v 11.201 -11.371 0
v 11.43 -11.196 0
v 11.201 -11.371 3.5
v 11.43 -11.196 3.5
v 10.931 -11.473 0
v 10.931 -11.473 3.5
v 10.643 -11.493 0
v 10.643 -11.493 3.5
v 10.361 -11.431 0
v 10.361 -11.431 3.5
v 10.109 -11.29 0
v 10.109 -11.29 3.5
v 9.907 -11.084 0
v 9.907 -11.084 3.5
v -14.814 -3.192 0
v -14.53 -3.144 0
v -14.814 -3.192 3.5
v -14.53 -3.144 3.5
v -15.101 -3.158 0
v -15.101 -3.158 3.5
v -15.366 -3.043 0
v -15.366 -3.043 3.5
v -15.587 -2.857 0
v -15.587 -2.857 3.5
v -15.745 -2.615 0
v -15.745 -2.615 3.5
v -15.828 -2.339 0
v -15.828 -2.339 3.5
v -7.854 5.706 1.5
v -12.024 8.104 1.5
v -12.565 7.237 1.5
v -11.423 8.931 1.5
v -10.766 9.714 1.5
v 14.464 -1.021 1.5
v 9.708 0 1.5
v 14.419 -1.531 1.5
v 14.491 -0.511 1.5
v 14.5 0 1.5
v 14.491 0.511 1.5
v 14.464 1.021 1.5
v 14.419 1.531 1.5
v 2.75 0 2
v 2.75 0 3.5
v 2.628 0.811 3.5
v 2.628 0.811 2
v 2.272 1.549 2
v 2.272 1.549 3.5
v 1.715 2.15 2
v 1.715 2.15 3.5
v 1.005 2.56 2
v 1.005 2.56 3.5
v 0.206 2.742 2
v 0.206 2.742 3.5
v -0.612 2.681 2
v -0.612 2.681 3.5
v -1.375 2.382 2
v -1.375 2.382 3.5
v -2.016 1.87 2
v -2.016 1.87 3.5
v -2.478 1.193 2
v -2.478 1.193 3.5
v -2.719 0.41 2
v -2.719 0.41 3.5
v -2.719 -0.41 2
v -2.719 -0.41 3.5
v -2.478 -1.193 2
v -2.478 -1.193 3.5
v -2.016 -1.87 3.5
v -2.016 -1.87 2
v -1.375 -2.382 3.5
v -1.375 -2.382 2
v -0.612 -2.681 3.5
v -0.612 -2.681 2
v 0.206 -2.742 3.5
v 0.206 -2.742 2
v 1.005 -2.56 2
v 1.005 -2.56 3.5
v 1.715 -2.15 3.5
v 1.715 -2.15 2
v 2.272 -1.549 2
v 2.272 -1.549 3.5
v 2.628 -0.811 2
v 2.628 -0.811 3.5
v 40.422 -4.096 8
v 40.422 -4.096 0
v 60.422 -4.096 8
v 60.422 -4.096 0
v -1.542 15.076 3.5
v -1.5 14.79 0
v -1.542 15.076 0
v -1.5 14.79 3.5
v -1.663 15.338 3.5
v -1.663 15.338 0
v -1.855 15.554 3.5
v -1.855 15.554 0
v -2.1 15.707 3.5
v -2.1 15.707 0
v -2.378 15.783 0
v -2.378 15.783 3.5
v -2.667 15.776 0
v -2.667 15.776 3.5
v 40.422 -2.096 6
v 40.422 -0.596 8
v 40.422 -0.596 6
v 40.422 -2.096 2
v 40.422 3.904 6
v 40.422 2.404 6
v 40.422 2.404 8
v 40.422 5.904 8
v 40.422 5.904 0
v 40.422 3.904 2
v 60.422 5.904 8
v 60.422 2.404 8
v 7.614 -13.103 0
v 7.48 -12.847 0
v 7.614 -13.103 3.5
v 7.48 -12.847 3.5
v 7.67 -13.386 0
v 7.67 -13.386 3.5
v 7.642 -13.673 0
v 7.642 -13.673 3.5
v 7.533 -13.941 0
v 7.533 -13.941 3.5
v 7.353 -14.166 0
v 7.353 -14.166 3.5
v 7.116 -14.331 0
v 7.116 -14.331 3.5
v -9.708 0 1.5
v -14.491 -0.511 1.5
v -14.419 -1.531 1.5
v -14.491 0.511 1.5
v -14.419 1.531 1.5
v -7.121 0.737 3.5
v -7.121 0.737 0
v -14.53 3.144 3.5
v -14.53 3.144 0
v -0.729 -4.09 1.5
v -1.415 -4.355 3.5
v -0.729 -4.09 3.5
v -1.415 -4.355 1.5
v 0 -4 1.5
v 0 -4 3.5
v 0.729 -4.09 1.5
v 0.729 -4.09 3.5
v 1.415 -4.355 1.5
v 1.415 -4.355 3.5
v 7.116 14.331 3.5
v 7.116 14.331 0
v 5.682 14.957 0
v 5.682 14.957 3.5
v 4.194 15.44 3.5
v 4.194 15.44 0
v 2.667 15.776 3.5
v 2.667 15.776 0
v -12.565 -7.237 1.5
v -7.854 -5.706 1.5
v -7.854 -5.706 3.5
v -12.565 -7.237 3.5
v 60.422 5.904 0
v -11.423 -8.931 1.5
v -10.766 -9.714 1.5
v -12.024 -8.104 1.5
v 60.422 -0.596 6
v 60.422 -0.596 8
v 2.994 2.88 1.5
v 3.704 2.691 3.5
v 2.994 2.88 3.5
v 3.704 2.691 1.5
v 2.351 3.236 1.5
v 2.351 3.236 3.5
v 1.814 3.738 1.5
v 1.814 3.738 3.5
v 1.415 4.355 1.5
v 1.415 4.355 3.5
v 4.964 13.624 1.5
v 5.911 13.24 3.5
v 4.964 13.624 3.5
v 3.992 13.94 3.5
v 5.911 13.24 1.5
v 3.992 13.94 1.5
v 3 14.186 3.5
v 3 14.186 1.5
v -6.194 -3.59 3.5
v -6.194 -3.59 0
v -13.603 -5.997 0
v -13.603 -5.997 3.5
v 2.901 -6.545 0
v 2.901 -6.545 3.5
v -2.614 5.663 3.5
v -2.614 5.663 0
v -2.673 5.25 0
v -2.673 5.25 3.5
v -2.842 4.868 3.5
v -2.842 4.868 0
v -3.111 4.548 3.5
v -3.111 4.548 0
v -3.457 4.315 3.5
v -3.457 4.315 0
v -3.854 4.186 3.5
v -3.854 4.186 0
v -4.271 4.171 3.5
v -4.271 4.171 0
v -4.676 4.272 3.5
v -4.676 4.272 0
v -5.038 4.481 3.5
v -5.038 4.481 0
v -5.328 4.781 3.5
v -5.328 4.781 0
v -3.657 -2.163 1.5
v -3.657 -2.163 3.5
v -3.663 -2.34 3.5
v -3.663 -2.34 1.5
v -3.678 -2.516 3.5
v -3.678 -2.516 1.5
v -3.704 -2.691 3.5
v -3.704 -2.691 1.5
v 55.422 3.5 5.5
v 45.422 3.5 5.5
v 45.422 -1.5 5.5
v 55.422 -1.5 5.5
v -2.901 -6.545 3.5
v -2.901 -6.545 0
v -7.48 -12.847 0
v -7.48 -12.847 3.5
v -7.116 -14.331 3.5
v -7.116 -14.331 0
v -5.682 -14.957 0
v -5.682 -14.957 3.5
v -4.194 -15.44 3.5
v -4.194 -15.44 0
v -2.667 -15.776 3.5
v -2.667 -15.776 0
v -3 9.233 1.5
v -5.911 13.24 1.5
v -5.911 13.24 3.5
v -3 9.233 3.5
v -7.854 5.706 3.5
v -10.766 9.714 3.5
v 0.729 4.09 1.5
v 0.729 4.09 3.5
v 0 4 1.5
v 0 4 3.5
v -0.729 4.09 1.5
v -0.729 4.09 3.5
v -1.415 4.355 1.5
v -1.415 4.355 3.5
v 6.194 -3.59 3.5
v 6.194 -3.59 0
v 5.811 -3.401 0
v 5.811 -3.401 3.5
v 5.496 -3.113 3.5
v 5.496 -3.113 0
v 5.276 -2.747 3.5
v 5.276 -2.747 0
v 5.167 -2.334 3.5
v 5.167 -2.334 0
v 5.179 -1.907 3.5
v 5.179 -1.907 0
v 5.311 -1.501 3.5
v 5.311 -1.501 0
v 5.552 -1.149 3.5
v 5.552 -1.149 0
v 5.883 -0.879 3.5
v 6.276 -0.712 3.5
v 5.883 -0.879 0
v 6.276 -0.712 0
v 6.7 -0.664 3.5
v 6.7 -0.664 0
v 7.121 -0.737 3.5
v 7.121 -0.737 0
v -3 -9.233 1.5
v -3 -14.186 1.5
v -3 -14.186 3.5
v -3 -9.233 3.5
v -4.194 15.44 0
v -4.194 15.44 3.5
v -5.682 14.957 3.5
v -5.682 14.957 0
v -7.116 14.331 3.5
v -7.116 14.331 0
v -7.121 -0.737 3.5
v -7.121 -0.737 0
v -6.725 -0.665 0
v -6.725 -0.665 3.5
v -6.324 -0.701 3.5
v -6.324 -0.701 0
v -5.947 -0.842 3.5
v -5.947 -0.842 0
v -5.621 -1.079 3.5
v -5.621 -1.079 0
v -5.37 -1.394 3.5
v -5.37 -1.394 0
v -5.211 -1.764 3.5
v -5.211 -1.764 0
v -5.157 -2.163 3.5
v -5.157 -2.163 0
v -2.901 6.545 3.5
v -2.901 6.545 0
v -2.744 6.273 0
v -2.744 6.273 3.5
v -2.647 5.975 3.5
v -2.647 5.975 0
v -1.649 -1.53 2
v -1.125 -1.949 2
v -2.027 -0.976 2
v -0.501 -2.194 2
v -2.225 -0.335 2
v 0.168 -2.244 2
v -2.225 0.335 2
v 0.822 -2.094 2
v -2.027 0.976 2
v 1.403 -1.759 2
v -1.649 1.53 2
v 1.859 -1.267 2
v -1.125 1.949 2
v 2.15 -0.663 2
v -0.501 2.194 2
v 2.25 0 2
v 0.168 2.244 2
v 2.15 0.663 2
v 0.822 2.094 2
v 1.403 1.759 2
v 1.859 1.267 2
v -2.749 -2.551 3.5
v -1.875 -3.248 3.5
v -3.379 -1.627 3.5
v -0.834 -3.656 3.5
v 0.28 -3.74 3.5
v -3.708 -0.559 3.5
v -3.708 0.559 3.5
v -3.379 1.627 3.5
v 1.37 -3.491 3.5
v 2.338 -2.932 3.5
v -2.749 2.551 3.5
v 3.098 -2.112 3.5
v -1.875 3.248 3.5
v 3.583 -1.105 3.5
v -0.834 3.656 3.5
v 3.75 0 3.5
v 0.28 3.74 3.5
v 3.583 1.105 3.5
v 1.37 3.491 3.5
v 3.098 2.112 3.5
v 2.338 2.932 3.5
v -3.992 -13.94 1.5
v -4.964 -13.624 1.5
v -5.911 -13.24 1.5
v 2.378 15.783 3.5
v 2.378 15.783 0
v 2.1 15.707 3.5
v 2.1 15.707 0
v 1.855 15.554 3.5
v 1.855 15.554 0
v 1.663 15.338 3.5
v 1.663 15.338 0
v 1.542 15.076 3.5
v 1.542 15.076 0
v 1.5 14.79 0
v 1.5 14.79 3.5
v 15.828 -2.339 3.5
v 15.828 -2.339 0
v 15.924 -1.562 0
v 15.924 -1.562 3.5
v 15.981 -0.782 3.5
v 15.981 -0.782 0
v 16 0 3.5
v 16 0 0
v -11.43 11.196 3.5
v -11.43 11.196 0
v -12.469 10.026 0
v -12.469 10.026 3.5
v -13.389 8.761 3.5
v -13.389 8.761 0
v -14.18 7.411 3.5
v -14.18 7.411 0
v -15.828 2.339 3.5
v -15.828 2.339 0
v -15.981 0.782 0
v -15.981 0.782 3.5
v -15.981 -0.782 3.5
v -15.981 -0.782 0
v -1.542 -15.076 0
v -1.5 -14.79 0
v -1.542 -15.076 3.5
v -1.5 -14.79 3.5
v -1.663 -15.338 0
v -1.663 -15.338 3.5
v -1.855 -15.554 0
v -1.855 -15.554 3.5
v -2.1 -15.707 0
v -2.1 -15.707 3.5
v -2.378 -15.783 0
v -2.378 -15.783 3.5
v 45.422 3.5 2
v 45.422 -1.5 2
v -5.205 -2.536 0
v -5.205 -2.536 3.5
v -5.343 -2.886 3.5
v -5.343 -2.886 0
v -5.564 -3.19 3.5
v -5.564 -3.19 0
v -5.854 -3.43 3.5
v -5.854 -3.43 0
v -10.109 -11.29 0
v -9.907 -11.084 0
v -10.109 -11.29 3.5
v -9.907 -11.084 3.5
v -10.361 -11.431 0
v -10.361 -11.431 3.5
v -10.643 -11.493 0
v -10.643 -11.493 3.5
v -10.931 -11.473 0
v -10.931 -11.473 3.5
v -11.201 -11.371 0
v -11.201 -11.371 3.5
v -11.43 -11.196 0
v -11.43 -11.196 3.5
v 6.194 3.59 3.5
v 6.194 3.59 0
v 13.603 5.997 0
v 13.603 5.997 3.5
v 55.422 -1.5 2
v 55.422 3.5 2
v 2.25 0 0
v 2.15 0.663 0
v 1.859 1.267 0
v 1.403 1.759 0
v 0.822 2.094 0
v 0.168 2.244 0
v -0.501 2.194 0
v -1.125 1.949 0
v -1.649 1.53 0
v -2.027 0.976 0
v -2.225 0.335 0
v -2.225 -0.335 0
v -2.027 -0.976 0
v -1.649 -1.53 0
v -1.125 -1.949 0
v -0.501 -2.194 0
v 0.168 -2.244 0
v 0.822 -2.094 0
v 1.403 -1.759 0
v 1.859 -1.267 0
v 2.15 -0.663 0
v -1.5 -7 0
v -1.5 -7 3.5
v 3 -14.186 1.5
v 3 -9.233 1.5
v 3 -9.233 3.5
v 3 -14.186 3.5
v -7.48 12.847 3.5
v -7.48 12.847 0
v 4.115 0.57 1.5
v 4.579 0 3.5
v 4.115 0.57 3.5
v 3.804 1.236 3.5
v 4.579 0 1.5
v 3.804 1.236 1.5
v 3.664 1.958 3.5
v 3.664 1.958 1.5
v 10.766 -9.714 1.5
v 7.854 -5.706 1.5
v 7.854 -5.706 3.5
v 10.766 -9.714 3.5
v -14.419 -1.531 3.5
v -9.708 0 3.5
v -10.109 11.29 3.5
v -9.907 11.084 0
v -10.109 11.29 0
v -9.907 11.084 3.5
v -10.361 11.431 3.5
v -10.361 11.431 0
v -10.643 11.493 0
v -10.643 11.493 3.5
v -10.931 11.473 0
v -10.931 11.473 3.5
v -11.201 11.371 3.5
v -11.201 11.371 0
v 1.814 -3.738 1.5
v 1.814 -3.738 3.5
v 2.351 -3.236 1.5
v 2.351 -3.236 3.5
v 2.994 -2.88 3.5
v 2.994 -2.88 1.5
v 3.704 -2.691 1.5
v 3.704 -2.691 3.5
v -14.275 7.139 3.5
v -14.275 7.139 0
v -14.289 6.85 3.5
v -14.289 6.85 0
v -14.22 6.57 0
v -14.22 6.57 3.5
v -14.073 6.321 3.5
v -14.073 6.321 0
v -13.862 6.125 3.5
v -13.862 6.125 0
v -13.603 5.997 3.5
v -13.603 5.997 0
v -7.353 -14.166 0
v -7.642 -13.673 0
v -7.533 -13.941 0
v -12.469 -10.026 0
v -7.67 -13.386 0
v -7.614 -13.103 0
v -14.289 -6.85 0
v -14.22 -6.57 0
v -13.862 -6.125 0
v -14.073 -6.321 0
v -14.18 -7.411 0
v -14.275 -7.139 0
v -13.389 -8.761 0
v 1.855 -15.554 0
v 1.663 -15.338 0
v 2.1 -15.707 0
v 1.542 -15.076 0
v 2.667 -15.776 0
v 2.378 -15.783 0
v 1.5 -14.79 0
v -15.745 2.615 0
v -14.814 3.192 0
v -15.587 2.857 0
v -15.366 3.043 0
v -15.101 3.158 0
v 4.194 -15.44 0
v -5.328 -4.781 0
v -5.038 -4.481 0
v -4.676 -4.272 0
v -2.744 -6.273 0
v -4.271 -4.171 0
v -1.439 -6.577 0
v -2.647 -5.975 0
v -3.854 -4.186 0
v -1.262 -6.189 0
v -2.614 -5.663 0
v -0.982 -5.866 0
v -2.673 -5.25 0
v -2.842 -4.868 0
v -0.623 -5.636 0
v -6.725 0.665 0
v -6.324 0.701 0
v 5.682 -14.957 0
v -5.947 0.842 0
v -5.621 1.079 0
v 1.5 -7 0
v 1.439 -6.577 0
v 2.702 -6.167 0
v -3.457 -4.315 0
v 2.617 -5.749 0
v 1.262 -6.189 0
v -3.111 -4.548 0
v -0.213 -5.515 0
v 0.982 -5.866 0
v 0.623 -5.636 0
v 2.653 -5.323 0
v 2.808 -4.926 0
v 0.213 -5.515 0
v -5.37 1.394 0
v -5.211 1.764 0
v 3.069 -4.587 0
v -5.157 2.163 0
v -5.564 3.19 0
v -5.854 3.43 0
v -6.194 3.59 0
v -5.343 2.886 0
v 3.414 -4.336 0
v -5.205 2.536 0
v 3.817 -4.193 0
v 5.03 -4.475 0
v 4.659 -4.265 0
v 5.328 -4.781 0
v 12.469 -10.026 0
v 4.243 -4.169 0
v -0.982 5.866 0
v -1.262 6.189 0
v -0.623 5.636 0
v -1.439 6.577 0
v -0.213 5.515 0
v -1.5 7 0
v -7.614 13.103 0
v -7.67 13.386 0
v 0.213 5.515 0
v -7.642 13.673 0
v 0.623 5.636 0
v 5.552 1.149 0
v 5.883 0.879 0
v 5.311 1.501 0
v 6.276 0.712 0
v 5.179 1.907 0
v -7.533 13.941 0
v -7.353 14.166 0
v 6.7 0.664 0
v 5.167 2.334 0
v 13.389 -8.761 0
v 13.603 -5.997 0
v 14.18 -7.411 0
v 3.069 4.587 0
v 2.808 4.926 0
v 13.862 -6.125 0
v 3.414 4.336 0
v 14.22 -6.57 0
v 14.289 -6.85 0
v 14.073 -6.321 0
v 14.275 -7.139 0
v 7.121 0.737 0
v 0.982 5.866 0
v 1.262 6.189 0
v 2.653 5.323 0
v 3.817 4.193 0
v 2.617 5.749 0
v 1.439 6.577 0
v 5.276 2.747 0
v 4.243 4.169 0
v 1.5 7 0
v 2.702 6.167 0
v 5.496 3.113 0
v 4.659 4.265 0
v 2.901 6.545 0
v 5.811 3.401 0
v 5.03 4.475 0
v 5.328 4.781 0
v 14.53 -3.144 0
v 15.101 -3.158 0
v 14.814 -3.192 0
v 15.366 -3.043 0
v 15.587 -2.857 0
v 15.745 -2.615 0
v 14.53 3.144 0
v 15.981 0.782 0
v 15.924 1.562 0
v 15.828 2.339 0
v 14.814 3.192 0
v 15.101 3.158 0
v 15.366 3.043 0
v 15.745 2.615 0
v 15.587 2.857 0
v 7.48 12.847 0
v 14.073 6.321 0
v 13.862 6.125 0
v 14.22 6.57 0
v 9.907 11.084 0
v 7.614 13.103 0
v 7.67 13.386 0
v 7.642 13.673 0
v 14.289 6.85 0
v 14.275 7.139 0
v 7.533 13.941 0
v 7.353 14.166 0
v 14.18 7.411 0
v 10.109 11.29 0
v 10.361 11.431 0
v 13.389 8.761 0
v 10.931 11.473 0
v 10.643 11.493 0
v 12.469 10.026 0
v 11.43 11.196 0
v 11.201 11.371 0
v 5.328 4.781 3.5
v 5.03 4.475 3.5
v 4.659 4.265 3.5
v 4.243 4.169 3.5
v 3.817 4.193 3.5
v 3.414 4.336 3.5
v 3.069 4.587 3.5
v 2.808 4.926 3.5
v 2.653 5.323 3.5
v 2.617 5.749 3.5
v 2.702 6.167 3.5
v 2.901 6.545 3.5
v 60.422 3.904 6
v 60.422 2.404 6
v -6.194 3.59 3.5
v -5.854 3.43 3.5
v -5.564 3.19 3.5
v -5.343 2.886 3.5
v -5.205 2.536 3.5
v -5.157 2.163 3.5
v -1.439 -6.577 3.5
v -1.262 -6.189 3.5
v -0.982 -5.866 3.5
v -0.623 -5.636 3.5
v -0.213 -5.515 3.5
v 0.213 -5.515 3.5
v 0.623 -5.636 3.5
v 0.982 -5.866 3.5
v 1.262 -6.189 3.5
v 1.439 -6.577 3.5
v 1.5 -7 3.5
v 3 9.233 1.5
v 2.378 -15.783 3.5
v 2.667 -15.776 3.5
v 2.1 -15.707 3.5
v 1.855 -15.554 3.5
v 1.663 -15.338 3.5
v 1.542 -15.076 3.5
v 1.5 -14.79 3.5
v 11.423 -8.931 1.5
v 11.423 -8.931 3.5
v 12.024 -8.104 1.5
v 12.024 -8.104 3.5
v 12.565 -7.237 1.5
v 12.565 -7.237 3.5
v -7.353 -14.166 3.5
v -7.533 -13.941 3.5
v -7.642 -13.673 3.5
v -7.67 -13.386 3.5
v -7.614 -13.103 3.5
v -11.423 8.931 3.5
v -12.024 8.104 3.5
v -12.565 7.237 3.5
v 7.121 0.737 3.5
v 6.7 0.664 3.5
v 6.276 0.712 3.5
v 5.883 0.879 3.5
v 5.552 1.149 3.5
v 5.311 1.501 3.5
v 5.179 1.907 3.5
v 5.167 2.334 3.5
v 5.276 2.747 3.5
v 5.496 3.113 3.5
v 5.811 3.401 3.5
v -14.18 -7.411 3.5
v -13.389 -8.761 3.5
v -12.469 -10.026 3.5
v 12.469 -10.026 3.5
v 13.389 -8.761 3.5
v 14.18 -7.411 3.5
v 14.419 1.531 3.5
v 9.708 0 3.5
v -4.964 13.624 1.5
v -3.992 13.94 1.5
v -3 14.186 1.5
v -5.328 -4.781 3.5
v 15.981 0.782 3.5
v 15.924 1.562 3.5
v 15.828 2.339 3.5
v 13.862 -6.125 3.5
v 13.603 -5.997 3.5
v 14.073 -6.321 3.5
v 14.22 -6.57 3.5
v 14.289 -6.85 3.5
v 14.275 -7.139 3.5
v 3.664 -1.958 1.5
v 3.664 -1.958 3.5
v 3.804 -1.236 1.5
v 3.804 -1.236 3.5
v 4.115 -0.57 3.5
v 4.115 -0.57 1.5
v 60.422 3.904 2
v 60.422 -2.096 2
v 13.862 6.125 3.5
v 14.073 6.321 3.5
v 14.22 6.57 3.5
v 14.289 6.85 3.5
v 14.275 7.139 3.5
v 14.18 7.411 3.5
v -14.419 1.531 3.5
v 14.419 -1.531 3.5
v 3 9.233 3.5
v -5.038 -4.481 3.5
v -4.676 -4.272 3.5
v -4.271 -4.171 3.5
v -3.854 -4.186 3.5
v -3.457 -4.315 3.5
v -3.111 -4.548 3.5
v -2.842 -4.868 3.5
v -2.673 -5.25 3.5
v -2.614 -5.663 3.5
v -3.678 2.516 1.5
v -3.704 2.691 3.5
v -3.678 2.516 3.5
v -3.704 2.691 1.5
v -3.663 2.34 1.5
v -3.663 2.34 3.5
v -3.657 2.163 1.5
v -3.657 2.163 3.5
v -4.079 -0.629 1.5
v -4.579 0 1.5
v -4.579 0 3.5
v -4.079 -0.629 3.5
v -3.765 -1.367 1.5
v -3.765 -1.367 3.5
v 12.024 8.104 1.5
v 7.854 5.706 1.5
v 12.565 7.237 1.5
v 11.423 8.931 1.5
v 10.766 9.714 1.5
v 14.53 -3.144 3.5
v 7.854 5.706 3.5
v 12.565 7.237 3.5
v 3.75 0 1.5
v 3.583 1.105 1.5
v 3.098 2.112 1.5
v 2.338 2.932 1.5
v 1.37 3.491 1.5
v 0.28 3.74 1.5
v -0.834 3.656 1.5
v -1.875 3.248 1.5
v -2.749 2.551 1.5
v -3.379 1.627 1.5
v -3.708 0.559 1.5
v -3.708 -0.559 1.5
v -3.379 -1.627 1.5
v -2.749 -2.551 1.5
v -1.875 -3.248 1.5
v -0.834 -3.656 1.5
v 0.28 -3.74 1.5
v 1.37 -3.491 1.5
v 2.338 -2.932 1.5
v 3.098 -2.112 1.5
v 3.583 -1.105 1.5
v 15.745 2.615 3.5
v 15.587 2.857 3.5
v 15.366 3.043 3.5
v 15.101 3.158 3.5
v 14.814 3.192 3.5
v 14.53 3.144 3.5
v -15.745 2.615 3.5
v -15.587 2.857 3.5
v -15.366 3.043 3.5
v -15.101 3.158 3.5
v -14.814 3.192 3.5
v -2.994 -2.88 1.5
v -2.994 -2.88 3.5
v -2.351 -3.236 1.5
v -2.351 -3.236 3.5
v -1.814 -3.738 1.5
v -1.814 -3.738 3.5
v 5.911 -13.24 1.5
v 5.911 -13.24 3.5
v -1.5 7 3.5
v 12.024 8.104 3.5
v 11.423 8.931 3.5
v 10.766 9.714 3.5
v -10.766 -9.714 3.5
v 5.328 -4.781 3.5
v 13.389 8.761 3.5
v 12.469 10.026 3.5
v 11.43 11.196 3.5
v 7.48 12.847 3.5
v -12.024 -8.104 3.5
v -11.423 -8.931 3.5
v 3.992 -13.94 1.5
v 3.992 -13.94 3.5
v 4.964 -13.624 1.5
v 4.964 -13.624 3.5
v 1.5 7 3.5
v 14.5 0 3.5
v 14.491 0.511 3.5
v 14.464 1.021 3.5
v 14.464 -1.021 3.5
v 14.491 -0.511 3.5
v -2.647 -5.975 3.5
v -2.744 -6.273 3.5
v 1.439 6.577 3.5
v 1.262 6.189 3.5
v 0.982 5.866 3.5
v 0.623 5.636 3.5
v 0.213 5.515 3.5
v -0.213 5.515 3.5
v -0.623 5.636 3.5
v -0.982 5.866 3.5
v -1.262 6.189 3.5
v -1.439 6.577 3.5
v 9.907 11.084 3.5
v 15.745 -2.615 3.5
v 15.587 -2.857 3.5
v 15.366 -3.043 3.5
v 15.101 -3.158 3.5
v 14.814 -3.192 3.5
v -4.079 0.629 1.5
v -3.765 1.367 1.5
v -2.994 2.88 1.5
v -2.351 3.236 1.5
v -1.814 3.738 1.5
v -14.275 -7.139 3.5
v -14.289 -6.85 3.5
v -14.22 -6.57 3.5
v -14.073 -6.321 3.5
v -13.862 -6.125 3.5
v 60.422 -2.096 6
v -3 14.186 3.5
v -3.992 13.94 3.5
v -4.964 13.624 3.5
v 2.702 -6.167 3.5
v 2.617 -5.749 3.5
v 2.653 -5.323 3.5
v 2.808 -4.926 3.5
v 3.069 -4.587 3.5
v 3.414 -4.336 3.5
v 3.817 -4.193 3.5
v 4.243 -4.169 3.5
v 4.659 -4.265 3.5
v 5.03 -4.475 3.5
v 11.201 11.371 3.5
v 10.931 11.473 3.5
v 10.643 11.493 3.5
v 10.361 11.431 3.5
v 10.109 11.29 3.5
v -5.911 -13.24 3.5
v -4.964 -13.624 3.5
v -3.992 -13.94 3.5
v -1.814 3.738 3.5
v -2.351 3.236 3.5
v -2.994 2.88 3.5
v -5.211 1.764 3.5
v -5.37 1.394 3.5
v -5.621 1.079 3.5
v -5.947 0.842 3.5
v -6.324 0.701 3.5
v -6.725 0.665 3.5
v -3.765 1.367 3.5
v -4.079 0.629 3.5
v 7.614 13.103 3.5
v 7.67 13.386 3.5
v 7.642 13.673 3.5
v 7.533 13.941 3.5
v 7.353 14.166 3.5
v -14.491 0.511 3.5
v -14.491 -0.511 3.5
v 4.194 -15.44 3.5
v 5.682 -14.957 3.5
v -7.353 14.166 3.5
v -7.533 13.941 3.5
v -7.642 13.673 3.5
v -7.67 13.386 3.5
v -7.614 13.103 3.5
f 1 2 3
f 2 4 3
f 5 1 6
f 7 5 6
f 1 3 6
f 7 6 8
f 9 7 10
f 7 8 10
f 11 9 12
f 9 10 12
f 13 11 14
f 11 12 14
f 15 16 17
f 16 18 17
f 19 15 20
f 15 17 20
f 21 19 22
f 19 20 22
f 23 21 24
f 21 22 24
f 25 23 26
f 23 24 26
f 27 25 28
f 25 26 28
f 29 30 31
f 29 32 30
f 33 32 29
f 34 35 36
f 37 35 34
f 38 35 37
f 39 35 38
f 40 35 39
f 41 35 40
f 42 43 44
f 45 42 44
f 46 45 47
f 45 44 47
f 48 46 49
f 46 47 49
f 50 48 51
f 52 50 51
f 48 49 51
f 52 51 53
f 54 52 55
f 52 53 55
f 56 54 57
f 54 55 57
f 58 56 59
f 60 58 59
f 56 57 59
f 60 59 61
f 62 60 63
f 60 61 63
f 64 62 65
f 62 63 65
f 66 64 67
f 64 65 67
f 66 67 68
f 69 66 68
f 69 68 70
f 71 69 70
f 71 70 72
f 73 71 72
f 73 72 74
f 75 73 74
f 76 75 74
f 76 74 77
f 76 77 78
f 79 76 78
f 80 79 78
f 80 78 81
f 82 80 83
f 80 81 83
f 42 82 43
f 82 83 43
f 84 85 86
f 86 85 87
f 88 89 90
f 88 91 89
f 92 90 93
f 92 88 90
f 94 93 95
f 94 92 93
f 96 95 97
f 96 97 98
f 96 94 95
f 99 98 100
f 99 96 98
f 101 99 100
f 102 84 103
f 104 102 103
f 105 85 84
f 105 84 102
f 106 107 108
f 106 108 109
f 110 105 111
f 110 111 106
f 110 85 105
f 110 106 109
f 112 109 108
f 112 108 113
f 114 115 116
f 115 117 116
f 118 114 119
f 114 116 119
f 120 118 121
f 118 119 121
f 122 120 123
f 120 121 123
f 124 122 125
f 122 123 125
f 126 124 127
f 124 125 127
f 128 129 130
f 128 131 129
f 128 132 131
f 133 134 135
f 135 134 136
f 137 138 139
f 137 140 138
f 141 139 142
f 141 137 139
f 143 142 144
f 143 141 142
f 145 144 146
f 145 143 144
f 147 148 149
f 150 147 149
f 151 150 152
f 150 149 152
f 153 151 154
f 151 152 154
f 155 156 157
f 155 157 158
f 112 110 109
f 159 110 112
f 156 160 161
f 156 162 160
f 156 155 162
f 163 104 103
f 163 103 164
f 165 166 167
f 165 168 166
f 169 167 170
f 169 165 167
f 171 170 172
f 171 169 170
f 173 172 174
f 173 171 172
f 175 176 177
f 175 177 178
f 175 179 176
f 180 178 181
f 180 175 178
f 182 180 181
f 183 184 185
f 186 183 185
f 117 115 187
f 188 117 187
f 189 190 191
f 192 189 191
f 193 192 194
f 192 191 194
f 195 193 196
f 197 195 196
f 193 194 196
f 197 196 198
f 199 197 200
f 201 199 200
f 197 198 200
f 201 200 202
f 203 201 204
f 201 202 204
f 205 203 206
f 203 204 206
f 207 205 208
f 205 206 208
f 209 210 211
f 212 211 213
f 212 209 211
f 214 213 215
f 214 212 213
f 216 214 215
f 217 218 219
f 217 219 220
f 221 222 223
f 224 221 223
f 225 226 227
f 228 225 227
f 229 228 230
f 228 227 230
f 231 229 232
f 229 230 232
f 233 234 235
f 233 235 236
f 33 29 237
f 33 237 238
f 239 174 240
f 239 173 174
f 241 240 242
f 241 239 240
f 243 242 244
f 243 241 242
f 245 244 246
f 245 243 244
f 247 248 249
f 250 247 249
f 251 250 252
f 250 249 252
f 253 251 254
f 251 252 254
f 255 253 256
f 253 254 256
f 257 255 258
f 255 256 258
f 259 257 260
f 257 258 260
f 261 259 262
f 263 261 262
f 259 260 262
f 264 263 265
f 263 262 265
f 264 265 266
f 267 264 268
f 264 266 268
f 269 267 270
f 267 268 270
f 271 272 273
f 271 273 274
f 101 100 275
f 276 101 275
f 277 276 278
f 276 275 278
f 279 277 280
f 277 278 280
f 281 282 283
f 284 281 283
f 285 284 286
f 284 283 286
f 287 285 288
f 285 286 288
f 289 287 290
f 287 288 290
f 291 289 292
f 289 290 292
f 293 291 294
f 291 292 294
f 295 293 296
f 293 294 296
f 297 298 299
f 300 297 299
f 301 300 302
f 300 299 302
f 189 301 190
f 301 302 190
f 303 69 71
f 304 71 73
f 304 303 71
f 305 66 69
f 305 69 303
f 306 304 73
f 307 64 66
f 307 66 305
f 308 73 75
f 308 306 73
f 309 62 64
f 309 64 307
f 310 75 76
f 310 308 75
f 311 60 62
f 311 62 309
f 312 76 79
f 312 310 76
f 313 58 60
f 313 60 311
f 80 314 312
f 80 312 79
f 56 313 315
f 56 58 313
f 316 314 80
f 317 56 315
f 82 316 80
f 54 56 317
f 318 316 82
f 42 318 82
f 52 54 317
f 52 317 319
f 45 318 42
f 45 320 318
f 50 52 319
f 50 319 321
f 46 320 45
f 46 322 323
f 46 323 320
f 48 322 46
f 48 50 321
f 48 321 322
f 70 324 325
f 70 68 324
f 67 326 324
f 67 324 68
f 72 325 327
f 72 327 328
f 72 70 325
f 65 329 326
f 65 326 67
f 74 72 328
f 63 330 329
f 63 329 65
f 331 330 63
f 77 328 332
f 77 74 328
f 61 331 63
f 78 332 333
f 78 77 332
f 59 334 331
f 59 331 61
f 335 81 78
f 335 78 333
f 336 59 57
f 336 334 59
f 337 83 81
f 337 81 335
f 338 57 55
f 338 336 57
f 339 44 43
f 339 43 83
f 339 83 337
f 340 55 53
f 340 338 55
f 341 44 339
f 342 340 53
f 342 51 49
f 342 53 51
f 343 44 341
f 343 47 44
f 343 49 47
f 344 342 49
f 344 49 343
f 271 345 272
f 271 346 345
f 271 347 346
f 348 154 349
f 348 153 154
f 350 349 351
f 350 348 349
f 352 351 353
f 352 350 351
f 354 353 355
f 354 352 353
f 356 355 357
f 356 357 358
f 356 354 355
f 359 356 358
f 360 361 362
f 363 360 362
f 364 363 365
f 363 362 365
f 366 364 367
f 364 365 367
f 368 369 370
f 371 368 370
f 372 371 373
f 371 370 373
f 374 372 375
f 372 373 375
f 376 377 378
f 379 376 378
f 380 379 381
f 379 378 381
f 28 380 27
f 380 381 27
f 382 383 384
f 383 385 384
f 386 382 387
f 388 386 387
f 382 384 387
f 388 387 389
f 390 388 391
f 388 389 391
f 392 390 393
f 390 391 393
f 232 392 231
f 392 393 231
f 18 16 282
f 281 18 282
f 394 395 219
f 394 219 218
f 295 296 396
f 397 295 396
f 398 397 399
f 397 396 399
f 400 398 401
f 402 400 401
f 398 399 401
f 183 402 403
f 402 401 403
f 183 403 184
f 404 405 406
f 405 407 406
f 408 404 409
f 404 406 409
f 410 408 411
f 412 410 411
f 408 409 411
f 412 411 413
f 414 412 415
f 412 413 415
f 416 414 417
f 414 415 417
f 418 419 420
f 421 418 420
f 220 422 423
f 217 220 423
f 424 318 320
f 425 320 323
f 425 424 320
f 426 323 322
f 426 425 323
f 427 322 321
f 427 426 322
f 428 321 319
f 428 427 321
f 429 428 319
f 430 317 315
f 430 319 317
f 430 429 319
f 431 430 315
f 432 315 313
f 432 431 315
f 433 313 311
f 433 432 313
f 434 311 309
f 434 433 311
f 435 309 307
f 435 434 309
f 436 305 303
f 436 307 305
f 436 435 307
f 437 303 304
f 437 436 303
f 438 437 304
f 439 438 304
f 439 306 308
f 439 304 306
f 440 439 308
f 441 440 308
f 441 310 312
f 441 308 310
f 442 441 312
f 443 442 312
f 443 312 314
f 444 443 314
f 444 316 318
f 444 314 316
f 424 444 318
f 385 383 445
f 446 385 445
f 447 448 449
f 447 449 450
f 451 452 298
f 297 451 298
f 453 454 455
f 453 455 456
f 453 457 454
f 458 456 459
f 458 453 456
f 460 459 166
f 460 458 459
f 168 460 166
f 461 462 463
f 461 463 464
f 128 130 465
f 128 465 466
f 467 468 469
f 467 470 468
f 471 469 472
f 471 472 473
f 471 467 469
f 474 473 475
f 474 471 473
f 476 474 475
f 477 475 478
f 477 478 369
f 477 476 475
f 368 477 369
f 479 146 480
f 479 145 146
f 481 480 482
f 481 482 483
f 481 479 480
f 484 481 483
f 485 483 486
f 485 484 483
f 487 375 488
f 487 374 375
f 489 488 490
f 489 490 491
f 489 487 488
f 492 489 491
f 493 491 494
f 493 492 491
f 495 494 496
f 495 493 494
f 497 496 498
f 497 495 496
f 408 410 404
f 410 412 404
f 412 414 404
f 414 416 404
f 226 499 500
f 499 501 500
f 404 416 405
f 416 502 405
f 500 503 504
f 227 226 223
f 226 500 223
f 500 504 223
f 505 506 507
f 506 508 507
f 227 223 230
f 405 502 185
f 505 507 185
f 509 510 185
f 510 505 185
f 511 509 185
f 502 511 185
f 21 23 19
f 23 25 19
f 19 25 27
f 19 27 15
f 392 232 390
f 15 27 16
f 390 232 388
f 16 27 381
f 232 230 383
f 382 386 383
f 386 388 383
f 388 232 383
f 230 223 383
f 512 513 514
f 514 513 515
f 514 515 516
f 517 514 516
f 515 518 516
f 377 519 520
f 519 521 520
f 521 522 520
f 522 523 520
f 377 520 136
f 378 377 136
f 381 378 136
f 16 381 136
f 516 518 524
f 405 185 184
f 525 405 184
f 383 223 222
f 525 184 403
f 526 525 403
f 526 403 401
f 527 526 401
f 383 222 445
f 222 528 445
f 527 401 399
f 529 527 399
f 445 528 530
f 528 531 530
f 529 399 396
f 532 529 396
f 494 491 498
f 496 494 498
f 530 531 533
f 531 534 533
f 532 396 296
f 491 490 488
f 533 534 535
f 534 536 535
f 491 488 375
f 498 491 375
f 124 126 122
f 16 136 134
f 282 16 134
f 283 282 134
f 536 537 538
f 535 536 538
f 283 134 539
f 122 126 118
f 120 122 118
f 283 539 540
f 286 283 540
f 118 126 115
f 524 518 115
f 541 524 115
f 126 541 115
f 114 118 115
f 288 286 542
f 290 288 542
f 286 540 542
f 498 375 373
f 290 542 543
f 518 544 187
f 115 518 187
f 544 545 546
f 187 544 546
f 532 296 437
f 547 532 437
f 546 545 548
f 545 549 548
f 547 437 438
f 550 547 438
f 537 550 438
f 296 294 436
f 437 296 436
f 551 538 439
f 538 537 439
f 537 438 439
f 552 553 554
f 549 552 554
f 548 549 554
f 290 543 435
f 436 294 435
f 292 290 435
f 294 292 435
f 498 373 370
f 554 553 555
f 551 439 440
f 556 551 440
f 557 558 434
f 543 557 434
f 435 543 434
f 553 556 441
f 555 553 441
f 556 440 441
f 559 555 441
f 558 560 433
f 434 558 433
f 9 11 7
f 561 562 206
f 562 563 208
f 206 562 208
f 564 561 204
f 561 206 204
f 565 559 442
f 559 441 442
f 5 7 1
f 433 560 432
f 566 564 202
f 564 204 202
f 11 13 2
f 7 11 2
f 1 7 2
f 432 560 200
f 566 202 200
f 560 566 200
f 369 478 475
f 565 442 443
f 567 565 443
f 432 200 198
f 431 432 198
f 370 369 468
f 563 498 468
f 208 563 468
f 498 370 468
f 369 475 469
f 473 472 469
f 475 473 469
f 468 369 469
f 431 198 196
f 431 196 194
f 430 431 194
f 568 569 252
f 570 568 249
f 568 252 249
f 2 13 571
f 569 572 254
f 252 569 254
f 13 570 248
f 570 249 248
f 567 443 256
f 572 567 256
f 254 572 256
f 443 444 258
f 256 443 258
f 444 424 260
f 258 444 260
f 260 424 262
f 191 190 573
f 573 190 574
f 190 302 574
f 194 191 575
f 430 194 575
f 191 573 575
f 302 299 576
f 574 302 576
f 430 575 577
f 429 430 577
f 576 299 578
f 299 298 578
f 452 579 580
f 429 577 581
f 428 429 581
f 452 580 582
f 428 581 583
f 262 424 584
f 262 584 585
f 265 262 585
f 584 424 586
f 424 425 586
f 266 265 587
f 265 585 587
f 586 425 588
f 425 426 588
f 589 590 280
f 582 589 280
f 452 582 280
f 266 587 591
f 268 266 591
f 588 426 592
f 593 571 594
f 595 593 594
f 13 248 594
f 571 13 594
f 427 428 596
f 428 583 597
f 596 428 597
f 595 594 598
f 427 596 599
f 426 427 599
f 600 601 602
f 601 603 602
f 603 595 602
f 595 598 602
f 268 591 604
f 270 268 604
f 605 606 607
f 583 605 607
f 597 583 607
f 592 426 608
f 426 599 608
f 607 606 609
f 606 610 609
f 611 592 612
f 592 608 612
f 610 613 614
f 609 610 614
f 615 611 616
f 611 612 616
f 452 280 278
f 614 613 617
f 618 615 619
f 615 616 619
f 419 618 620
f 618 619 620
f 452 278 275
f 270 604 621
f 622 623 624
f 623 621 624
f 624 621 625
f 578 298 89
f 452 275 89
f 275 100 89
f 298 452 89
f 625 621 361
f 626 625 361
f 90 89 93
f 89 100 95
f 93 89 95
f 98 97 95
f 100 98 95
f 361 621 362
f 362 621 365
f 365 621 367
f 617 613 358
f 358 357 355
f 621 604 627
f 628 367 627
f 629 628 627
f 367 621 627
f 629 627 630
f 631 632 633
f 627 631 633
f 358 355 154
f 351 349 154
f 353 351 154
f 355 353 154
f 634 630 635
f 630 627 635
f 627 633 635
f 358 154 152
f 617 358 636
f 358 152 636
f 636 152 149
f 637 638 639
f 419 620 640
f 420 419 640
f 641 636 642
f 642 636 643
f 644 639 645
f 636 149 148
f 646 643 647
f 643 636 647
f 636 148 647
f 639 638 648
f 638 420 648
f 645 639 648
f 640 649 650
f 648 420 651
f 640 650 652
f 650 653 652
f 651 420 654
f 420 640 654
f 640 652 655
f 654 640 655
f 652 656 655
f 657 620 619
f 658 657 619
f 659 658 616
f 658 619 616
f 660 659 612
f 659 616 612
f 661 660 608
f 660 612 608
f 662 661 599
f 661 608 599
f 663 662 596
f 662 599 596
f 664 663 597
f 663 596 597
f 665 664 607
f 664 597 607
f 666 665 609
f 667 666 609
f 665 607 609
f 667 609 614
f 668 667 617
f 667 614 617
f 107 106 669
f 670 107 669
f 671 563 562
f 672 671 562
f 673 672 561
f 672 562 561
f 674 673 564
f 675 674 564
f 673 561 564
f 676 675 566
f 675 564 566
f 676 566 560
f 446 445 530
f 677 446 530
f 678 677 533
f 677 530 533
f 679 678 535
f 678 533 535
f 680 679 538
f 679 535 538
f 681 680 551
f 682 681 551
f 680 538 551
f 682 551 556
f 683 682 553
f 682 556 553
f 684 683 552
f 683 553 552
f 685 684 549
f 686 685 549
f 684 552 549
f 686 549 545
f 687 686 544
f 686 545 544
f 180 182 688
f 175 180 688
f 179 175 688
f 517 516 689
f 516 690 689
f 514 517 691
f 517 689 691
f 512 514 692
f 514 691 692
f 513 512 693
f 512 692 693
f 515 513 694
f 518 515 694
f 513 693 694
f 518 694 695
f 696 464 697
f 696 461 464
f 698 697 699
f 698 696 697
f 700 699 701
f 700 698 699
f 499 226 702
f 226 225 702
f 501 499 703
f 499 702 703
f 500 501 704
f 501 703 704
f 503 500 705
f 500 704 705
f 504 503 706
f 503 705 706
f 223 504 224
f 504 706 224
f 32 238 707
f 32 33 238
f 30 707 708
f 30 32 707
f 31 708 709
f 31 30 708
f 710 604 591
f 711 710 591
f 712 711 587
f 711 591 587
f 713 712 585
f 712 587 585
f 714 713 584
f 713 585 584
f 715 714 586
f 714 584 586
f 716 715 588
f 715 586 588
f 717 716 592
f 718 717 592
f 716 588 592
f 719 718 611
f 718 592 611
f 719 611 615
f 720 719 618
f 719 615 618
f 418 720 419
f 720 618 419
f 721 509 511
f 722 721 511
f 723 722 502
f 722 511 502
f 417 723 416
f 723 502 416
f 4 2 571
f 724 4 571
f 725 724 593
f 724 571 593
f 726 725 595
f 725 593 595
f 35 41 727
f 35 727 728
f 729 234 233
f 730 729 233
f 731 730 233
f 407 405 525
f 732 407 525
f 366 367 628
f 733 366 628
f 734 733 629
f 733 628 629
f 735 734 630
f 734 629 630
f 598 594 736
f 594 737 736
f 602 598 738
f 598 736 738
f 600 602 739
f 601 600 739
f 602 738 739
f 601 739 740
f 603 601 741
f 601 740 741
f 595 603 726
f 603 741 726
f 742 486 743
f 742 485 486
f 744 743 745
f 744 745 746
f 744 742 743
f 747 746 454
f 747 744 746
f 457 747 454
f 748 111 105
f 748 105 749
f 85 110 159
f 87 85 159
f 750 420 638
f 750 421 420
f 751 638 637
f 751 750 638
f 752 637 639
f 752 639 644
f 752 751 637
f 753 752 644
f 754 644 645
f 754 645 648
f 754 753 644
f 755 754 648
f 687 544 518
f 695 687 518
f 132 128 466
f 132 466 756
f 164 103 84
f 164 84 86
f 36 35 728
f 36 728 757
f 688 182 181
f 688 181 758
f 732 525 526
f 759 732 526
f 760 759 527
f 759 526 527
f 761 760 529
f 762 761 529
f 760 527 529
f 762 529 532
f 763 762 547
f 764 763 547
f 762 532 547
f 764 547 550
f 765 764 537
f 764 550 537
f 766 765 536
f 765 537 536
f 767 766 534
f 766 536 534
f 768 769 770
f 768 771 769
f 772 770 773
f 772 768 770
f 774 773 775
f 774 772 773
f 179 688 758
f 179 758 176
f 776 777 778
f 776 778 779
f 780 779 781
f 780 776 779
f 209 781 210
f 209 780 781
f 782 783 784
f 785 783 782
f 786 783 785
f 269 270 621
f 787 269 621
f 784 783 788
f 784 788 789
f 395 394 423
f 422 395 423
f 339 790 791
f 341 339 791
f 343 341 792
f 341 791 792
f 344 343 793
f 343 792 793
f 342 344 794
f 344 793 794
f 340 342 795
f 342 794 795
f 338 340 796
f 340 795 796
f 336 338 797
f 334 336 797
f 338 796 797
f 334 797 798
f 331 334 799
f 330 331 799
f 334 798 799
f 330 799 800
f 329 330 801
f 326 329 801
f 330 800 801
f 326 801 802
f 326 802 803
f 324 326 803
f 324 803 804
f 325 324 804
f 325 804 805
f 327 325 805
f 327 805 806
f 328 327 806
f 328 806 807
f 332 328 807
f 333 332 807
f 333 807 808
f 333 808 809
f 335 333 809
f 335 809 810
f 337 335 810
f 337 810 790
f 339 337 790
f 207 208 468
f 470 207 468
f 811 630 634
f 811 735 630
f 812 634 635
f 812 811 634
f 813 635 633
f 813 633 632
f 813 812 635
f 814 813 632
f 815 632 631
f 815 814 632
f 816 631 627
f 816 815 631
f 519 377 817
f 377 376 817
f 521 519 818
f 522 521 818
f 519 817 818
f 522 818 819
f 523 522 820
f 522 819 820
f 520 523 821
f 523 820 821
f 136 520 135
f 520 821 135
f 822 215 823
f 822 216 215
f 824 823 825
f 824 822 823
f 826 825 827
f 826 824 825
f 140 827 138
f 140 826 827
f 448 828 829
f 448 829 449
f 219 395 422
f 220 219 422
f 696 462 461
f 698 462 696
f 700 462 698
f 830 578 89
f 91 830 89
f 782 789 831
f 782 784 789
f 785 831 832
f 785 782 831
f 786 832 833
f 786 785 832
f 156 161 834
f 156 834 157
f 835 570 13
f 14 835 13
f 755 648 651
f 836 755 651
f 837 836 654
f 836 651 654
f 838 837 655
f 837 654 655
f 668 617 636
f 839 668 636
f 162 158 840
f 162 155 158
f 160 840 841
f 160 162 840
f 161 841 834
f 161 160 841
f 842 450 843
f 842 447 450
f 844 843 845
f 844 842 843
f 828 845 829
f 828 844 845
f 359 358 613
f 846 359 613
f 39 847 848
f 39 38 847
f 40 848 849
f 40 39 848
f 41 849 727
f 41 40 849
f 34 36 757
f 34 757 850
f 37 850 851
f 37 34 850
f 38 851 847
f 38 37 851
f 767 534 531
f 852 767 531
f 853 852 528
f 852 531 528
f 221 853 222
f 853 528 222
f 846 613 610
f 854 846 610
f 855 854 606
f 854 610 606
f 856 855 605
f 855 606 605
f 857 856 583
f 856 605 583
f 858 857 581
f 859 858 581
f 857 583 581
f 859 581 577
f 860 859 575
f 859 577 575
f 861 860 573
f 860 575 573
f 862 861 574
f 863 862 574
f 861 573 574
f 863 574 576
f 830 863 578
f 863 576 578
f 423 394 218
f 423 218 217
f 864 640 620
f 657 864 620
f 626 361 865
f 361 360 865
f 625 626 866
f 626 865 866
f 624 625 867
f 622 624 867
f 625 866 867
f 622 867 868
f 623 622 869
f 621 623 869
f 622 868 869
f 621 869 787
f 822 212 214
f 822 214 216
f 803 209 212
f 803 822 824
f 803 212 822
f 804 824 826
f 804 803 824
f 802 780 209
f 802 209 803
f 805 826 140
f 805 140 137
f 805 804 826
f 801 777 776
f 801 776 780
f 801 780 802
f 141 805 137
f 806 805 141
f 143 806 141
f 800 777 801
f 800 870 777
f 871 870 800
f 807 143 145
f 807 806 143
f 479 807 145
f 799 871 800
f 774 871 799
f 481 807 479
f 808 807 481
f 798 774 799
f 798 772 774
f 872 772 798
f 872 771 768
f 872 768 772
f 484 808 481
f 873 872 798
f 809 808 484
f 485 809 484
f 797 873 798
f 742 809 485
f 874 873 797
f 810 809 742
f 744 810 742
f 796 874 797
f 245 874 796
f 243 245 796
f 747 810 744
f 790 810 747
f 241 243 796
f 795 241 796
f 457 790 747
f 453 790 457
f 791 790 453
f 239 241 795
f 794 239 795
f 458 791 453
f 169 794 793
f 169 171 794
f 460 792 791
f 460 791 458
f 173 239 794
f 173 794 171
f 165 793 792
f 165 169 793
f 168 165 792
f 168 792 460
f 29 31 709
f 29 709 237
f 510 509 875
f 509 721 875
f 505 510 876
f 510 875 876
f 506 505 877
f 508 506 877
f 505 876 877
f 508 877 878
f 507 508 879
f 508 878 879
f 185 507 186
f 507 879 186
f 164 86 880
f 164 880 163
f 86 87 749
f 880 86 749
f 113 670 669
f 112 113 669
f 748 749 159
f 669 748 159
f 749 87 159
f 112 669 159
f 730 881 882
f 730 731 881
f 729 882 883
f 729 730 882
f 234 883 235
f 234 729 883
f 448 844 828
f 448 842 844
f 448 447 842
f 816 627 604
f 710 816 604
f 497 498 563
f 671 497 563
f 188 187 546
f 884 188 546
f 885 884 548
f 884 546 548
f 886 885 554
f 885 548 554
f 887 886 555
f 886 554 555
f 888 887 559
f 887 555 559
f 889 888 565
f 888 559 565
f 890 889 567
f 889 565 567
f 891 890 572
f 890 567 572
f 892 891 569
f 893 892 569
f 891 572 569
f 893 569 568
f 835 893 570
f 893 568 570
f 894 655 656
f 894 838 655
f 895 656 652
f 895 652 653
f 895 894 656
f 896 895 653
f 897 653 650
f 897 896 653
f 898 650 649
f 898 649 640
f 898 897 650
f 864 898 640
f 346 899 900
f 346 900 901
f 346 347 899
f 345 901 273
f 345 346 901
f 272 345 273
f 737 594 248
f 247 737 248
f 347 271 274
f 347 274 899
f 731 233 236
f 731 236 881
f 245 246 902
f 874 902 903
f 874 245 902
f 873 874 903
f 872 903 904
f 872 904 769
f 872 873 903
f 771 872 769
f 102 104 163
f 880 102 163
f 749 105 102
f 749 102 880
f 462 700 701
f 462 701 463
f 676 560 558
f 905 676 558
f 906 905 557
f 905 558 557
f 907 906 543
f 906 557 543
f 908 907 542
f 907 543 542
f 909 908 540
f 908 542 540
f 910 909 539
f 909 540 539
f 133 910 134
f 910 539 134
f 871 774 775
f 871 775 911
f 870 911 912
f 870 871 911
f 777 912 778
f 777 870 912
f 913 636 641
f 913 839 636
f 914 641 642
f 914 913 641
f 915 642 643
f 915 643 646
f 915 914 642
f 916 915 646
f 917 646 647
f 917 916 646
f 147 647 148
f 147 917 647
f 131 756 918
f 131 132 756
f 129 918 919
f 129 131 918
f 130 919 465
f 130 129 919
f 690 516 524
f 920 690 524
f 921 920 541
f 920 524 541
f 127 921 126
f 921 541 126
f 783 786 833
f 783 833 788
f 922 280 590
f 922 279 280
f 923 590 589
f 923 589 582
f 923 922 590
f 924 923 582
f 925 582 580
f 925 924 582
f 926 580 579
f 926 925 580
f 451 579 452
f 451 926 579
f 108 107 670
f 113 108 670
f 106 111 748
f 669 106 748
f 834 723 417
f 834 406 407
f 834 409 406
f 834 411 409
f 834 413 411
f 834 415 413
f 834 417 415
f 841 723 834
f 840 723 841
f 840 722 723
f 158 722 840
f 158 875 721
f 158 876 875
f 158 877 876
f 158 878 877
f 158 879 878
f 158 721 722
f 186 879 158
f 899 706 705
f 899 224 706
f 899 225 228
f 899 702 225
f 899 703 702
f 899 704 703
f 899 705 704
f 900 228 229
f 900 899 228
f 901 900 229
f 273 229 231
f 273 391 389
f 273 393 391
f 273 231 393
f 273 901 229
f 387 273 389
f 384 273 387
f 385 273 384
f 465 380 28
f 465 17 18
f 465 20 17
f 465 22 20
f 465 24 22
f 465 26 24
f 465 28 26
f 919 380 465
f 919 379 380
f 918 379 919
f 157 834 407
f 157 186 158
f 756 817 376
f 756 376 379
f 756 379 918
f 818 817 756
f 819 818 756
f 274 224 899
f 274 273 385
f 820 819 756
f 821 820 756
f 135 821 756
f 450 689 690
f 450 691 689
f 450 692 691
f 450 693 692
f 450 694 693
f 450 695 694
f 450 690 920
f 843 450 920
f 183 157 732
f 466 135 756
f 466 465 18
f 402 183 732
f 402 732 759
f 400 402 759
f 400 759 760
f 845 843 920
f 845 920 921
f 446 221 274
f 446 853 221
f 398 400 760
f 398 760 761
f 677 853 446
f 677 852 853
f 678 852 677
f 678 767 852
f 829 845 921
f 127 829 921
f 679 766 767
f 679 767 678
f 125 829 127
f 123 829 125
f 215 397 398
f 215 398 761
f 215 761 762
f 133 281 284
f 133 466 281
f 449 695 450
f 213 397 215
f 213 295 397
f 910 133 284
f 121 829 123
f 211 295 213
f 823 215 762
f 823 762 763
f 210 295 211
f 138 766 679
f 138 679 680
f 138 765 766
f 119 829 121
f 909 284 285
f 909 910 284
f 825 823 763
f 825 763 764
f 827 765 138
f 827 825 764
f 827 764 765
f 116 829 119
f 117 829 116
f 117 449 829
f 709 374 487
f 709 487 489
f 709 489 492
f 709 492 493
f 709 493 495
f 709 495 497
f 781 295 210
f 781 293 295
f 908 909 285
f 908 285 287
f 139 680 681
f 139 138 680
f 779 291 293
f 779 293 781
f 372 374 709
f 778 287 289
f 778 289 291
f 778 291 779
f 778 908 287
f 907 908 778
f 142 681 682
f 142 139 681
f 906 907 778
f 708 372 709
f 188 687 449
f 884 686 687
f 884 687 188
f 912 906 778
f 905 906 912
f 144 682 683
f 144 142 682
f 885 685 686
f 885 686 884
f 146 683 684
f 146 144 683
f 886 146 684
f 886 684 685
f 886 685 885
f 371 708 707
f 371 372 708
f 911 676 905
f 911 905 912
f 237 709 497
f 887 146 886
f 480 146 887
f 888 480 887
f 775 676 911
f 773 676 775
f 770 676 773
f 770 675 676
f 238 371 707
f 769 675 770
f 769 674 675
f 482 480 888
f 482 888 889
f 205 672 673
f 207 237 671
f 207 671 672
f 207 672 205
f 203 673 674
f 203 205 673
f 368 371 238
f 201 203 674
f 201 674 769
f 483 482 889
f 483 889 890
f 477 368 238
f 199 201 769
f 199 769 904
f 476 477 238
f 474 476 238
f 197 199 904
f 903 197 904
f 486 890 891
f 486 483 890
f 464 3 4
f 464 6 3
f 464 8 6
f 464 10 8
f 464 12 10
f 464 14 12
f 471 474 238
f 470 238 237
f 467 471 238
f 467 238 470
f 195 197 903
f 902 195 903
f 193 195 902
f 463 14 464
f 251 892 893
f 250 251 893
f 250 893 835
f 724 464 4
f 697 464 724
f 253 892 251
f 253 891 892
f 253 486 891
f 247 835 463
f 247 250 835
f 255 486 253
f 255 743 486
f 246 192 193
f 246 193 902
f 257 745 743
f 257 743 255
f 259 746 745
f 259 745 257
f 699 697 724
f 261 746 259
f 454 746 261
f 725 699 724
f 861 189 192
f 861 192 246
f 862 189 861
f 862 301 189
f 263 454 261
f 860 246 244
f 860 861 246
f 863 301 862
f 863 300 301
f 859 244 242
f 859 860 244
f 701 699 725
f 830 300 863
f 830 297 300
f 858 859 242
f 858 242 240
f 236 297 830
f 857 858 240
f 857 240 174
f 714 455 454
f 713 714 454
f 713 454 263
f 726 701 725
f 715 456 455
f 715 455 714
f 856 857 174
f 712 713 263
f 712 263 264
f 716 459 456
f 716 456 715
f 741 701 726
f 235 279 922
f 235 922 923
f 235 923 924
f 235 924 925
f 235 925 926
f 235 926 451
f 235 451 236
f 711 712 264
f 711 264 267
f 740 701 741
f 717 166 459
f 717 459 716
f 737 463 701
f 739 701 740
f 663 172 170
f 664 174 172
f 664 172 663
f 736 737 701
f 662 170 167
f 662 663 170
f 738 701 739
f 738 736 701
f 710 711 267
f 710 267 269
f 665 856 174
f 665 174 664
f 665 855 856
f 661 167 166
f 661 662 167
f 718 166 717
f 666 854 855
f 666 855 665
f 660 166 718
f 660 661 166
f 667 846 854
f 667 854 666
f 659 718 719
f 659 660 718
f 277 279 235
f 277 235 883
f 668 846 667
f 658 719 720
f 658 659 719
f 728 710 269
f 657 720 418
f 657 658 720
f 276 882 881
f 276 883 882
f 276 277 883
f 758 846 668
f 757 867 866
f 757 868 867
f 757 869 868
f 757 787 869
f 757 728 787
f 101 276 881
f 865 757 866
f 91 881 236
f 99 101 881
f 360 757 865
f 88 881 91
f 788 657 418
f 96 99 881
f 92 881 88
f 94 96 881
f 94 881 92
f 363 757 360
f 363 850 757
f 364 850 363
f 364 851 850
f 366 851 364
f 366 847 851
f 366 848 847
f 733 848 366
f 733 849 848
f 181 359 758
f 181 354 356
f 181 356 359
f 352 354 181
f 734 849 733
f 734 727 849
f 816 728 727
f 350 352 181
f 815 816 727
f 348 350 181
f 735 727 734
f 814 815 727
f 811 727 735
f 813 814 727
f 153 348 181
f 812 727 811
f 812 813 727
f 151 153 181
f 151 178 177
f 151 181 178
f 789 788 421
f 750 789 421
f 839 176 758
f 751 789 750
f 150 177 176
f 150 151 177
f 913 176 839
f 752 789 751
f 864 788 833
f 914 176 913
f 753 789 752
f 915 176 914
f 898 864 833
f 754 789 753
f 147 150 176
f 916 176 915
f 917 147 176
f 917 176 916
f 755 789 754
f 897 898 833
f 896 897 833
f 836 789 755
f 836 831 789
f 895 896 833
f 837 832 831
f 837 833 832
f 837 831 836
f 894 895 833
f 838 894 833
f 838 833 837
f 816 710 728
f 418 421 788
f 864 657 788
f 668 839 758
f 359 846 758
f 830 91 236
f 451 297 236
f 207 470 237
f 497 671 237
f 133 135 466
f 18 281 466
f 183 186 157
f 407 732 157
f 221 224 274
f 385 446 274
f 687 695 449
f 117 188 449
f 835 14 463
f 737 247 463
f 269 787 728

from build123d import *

# Parameters (mm, degrees)
F0_R      = 2.25
F1_DEPTH  = 3.5
F2_T      = -1.5
F3_R      = 2.75
F4_DEPTH  = 1.5
F5_R      = 1
F6_W      = 20
F6_H      = 10
F7_DEPTH  = 6
F8_T      = -2
F9_W      = 20
F9_H      = 3.5
F10_DEPTH = 2
F11_W     = 10
F11_H     = 5
F12_DEPTH = 3.5


with BuildPart() as f1:
    # F0 (on Top) → F1 (new body)
    with BuildSketch(Plane.XY):
        with BuildLine():
            ThreePointArc((15.613411, -3.495911), (15.903059, -1.758611), (16, 0))
            ThreePointArc((16, 0), (15.903059, 1.758611), (15.613411, 3.495911))
            Line((15.613411, 3.495911), (7.120921, 0.736534))
            ThreePointArc((7.120921, 0.736534), (5.230811, 1.699593), (6.19387, 3.589704))
            Line((6.19387, 3.589704), (14.68636, 6.349081))
            ThreePointArc((14.68636, 6.349081), (12.944272, 9.404564), (10.57667, 12.005584))
            Line((10.57667, 12.005584), (5.328022, 4.781441))
            ThreePointArc((5.328022, 4.781441), (3.232819, 4.449593), (2.900971, 6.544797))
            Line((2.900971, 6.544797), (8.149619, 13.76894))
            ThreePointArc((8.149619, 13.76894), (4.944272, 15.216904), (1.5, 15.929532))
            Line((1.5, 15.929532), (1.5, 7))
            ThreePointArc((1.5, 7), (0, 5.5), (-1.5, 7))
            Line((-1.5, 7), (-1.5, 15.929532))
            ThreePointArc((-1.5, 15.929532), (-4.944272, 15.216904), (-8.149619, 13.76894))
            Line((-8.149619, 13.76894), (-2.900971, 6.544797))
            ThreePointArc((-2.900971, 6.544797), (-2.687912, 6.126644), (-2.614497, 5.663119))
            ThreePointArc((-2.614497, 5.663119), (-3.650971, 4.236534), (-5.328022, 4.781441))
            Line((-5.328022, 4.781441), (-10.57667, 12.005584))
            ThreePointArc((-10.57667, 12.005584), (-12.944272, 9.404564), (-14.68636, 6.349081))
            Line((-14.68636, 6.349081), (-6.19387, 3.589704))
            ThreePointArc((-6.19387, 3.589704), (-5.44387, 3.044797), (-5.157396, 2.163119))
            ThreePointArc((-5.157396, 2.163119), (-5.775718, 0.949593), (-7.120921, 0.736534))
            Line((-7.120921, 0.736534), (-15.613411, 3.495911))
            ThreePointArc((-15.613411, 3.495911), (-16, 0), (-15.613411, -3.495911))
            Line((-15.613411, -3.495911), (-7.120921, -0.736534))
            ThreePointArc((-7.120921, -0.736534), (-5.775718, -0.949593), (-5.157396, -2.163119))
            ThreePointArc((-5.157396, -2.163119), (-5.44387, -3.044797), (-6.19387, -3.589704))
            Line((-6.19387, -3.589704), (-14.68636, -6.349081))
            ThreePointArc((-14.68636, -6.349081), (-12.944272, -9.404564), (-10.57667, -12.005584))
            Line((-10.57667, -12.005584), (-5.328022, -4.781441))
            ThreePointArc((-5.328022, -4.781441), (-3.650971, -4.236534), (-2.614497, -5.663119))
            ThreePointArc((-2.614497, -5.663119), (-2.687912, -6.126644), (-2.900971, -6.544797))
            Line((-2.900971, -6.544797), (-8.149619, -13.76894))
            ThreePointArc((-8.149619, -13.76894), (-4.944272, -15.216904), (-1.5, -15.929532))
            Line((-1.5, -15.929532), (-1.5, -7))
            ThreePointArc((-1.5, -7), (0, -5.5), (1.5, -7))
            Line((1.5, -7), (1.5, -15.929532))
            ThreePointArc((1.5, -15.929532), (4.944272, -15.216904), (8.149619, -13.76894))
            Line((8.149619, -13.76894), (2.900971, -6.544797))
            ThreePointArc((2.900971, -6.544797), (3.232819, -4.449593), (5.328022, -4.781441))
            Line((5.328022, -4.781441), (10.57667, -12.005584))
            ThreePointArc((10.57667, -12.005584), (12.944272, -9.404564), (14.68636, -6.349081))
            Line((14.68636, -6.349081), (6.19387, -3.589704))
            ThreePointArc((6.19387, -3.589704), (5.230811, -1.699593), (7.120921, -0.736534))
            Line((7.120921, -0.736534), (15.613411, -3.495911))
        make_face()
        Circle(F0_R, mode=Mode.SUBTRACT)
    extrude(amount=F1_DEPTH)

    # F2
    f2_openings = [f1.faces().sort_by_distance(p)[0] for p in [
        (15.548447, 0, 3.5),
    ]]
    offset(amount=F2_T, openings=f2_openings)

    # F3 (on face) → F4 (cut)
    with BuildSketch(Plane.XY.offset(3.5)):
        Circle(F3_R)
    extrude(amount=-F4_DEPTH, mode=Mode.SUBTRACT)

    # F5
    f5_edges = [f1.edges().sort_by_distance(p)[0] for p in [
        (-10.57667, -12.005584, 1.75),
        (-8.149619, -13.76894, 1.75),
        (-1.5, -15.929532, 1.75),
        (1.5, -15.929532, 1.75),
        (8.149619, -13.76894, 1.75),
        (10.57667, -12.005584, 1.75),
        (14.68636, -6.349081, 1.75),
        (15.613411, 3.495911, 1.75),
        (15.613411, -3.495911, 1.75),
        (14.68636, 6.349081, 1.75),
        (10.57667, 12.005584, 1.75),
        (8.149619, 13.76894, 1.75),
        (-1.5, 15.929532, 1.75),
        (1.5, 15.929532, 1.75),
        (-10.57667, 12.005584, 1.75),
        (-8.149619, 13.76894, 1.75),
        (-15.613411, 3.495911, 1.75),
        (-15.613411, -3.495911, 1.75),
        (-14.68636, -6.349081, 1.75),
        (-14.68636, 6.349081, 1.75),
    ]]
    fillet(f5_edges, radius=F5_R)


with BuildPart() as f7:
    # F6 (on Top) → F7 (new body)
    with BuildSketch(Plane.XY):
        with Locations((50.421845, 0.903753)):
            Rectangle(F6_W, F6_H)
    extrude(amount=F7_DEPTH)

    # F8
    f8_openings = [f7.faces().sort_by_distance(p)[0] for p in [
        (40.421845, 0.903753, 3),
        (50.421845, 0.903753, 6),
        (60.421845, 0.903753, 3),
    ]]
    offset(amount=F8_T, openings=f8_openings)

    # F9 (on face) → F10 (join)
    with BuildSketch(Plane.XY.offset(6)):
        with Locations((50.421845, 4.153753)):
            Rectangle(F9_W, F9_H)
        with Locations((50.421845, -2.346247)):
            Rectangle(F9_W, F9_H)
    extrude(amount=F10_DEPTH)


with BuildPart() as f12:
    # F11 (on face) → F12 (new body)
    with BuildSketch(Plane.XY.offset(2)):
        with Locations((50.421845, 1)):
            Rectangle(F11_W, F11_H)
    extrude(amount=F12_DEPTH)


solid = Compound([f1.part, f7.part, f12.part])
